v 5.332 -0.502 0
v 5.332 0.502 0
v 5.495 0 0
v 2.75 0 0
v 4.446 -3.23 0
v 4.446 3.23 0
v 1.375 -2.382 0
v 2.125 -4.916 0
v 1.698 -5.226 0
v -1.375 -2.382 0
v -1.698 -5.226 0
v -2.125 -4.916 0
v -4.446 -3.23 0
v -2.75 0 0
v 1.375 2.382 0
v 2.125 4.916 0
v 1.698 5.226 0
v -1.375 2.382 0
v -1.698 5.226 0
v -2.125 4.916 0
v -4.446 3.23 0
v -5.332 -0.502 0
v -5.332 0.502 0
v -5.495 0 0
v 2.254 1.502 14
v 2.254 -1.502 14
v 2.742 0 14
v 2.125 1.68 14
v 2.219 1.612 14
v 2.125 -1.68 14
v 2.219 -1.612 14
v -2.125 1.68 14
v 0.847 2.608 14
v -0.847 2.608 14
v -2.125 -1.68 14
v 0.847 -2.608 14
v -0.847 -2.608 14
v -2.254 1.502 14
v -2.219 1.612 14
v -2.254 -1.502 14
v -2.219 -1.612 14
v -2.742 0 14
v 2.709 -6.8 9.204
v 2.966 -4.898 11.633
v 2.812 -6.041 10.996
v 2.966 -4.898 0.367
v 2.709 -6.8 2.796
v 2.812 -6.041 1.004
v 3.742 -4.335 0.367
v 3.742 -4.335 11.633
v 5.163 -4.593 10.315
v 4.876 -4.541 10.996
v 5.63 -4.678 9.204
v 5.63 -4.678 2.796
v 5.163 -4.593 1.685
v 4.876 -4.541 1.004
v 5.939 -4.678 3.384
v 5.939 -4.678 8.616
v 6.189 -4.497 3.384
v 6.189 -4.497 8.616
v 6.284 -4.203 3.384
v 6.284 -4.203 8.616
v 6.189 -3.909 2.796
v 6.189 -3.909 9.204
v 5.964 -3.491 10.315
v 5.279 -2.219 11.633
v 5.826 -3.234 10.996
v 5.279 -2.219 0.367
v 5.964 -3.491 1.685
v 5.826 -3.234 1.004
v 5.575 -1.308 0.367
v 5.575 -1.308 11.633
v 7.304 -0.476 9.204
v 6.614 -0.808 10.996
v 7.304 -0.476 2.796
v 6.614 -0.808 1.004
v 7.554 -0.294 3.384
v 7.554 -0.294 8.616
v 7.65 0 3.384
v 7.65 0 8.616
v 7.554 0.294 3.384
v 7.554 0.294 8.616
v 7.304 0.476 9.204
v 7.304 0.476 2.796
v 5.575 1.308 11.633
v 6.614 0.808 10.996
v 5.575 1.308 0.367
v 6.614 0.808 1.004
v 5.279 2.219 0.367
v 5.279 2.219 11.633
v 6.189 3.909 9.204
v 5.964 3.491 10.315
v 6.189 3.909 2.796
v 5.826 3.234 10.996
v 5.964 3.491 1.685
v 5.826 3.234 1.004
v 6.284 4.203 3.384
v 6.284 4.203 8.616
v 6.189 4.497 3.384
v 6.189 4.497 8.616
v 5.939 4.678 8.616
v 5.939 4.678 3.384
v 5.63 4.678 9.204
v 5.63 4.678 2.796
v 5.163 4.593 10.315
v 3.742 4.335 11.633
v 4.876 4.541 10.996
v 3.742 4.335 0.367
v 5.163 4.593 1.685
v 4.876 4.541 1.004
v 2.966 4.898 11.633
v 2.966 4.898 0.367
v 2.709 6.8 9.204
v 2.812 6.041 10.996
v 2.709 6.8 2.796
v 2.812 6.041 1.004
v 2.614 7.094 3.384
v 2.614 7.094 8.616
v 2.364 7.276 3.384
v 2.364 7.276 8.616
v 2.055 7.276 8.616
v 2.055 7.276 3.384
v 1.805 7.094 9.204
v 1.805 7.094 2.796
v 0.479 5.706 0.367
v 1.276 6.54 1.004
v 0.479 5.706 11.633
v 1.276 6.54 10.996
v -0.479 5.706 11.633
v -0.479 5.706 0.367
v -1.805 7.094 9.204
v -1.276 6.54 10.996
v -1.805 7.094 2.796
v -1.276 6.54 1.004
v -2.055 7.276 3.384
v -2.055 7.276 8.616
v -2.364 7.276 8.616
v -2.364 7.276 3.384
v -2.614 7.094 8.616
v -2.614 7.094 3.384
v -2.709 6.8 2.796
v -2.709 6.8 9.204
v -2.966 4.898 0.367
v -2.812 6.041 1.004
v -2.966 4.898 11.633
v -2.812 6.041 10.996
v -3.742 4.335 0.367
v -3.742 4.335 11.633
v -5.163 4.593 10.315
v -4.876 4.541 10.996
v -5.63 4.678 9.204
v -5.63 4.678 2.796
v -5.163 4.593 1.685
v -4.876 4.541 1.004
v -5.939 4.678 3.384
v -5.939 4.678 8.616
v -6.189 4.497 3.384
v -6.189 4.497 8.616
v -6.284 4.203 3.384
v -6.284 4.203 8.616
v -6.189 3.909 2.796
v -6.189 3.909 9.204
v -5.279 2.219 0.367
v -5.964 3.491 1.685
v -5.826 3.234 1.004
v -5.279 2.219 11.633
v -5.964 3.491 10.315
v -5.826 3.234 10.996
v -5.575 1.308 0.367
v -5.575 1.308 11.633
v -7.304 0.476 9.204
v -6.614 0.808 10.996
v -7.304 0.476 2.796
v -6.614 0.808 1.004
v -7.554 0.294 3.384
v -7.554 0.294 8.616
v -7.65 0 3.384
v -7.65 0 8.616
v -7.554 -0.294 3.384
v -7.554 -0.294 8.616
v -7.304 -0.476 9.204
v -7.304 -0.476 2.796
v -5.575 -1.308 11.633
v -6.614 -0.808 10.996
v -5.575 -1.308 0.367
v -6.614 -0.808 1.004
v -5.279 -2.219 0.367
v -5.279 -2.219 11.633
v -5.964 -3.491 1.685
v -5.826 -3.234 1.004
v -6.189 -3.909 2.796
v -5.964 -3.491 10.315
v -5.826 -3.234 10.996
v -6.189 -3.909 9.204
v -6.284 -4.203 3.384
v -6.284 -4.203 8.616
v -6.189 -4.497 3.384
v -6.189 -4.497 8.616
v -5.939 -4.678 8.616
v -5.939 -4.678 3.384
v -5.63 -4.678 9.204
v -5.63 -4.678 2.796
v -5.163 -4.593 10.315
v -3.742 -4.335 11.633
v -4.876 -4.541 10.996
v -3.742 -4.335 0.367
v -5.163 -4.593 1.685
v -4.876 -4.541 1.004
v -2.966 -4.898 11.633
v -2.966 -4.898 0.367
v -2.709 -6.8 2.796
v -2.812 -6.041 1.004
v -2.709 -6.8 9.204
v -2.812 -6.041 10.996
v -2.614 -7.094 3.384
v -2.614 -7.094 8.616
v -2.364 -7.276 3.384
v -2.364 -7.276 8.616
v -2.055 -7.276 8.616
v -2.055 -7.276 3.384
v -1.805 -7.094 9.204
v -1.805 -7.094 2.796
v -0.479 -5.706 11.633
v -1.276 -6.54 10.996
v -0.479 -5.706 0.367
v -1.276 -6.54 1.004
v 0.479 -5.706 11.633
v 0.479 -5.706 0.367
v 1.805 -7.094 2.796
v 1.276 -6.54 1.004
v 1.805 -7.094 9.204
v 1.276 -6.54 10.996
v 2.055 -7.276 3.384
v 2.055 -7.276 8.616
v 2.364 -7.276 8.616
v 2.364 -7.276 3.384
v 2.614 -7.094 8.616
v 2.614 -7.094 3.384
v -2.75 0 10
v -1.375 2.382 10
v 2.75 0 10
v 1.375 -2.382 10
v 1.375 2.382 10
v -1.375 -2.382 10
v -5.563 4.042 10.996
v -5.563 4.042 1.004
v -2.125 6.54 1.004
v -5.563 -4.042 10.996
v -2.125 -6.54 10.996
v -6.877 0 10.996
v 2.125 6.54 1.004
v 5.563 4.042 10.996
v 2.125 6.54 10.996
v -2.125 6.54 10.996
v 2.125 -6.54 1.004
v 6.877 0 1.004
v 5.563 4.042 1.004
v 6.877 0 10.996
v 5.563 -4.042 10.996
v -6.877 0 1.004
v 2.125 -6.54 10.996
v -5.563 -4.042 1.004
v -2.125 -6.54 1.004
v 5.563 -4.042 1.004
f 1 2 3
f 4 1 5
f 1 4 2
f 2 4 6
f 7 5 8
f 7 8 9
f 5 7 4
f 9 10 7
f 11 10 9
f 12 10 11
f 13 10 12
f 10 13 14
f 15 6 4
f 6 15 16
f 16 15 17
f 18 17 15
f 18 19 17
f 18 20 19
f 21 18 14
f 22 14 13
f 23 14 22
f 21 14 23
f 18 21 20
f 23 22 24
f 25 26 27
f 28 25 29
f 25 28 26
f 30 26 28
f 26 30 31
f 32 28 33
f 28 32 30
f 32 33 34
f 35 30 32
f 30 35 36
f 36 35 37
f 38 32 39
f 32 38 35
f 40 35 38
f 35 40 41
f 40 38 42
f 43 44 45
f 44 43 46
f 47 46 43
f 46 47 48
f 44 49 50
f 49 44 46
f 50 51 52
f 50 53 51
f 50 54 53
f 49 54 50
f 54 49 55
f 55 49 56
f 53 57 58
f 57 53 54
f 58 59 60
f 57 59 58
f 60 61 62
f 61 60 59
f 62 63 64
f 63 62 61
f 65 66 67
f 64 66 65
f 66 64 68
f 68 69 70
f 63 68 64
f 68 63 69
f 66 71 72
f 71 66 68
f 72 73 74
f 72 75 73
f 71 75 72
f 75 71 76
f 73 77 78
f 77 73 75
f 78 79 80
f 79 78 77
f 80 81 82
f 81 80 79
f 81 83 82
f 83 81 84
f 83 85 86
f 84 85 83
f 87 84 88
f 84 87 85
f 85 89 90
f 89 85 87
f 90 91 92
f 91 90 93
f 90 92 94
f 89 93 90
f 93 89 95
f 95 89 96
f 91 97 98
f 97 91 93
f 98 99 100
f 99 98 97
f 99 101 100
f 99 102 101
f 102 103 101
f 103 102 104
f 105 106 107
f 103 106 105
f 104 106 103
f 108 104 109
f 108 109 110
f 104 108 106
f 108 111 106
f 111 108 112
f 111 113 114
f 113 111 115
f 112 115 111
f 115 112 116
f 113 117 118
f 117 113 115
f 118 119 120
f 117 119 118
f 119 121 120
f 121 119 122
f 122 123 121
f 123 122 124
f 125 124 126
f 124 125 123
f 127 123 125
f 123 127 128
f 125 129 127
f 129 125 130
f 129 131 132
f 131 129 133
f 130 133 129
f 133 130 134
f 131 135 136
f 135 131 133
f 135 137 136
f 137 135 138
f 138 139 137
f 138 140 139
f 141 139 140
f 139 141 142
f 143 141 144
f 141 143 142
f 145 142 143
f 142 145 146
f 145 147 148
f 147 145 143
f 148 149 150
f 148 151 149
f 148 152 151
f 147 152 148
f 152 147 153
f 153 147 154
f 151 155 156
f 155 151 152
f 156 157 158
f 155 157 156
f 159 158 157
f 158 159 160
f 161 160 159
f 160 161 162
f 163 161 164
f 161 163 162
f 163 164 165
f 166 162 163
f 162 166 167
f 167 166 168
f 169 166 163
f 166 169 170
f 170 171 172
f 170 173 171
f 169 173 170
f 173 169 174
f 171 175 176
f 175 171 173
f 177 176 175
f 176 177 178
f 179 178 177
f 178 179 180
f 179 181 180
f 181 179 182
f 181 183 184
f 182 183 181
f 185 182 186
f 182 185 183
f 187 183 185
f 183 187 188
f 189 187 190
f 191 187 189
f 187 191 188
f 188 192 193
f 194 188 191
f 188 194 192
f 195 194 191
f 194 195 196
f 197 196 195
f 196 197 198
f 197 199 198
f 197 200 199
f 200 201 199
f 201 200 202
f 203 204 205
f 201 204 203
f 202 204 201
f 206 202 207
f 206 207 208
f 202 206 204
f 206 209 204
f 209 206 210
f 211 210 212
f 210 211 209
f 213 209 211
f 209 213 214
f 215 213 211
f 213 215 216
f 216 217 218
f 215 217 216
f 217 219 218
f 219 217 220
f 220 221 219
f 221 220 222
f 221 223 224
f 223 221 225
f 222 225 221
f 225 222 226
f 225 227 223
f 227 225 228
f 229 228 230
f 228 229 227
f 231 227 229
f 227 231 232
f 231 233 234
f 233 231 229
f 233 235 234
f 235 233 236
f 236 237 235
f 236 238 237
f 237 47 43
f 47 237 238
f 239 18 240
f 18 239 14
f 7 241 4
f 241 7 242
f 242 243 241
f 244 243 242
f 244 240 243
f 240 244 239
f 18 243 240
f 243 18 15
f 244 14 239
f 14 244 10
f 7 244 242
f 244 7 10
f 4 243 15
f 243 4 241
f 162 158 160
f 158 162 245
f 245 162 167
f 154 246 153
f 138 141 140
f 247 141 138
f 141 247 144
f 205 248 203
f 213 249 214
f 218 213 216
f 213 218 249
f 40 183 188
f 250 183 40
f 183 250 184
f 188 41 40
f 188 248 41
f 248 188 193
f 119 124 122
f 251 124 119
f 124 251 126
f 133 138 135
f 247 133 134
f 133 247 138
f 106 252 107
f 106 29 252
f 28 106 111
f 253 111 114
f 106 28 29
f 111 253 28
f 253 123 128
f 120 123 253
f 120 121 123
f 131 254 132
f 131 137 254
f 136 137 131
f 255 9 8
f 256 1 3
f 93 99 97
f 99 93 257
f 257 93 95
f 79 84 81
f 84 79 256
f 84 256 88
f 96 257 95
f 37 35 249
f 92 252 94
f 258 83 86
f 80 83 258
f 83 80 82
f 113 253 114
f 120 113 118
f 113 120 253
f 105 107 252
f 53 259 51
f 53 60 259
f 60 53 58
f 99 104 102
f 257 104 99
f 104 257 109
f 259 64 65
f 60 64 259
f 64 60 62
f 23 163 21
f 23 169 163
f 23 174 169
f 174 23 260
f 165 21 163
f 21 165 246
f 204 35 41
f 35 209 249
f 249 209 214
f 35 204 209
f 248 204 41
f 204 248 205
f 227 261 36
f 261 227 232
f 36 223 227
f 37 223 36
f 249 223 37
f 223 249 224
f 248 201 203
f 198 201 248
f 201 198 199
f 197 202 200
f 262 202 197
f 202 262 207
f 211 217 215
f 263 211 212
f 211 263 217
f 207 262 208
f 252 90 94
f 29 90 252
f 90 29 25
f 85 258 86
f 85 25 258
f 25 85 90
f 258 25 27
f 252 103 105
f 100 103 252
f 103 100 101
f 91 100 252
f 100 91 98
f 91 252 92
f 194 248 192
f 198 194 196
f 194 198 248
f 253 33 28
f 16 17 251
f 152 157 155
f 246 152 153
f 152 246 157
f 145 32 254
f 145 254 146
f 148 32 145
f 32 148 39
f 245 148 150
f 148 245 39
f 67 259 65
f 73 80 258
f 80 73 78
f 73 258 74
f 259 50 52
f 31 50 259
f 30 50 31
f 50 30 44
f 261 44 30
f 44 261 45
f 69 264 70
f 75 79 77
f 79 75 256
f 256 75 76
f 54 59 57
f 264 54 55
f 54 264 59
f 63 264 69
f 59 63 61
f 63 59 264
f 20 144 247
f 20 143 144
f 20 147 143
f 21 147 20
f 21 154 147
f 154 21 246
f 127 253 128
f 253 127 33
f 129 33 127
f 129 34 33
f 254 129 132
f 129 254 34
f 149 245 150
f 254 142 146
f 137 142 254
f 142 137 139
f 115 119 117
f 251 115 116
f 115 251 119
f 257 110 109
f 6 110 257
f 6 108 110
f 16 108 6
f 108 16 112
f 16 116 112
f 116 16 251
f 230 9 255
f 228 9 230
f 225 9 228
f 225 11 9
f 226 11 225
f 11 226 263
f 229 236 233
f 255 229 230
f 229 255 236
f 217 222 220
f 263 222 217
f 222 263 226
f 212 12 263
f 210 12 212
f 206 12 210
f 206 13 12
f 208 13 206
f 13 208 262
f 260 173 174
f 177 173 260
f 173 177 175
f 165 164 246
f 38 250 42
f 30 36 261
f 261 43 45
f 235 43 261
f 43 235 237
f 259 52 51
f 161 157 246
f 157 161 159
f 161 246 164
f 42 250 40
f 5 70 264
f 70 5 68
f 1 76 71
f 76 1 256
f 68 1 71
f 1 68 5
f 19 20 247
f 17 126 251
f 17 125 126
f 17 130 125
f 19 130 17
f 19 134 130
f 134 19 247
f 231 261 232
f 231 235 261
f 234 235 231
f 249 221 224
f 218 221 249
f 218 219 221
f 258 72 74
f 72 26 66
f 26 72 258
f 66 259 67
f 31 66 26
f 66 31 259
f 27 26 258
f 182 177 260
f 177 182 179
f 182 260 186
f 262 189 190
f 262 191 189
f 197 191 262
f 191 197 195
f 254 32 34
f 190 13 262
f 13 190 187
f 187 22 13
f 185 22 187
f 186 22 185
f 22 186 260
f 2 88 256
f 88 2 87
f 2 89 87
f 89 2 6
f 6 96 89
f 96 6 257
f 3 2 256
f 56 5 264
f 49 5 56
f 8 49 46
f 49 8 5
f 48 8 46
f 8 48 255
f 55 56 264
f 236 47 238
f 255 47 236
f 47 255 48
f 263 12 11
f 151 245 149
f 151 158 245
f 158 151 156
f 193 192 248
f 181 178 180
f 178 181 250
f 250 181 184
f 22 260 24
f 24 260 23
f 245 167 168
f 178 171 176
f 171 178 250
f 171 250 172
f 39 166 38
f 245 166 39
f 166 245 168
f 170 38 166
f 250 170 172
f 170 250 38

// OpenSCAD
bit = 5.5; // bit size (exterior)
bits = 6; // bit sides
s = 10; // desired bit indentation


// pretty-fy
 intersection(){
    // geary exterior
    color("red") difference(){
        linear_extrude(s+4)
            // pretty teeth
            minkowski(){
                // sharp teeth
                union(){
                    for(i = [0:360/s:359.99]){
                        // pointy triangle
                        rotate([0, 0, i])translate([bit,0]) scale([0.6, 0.5]) circle(bit/2, $fn=3);
                    }
                    circle(bit, $fn = s);
                }
                circle(0.5, $fn=s);
            }
        // bit part
        linear_extrude(10) circle(bit/2, $fn=6);
    }
    // low poly sphere for general shape
    translate([0, 0, bit + 0.5])
        sphere(bit + 3, $fn = s);
}
